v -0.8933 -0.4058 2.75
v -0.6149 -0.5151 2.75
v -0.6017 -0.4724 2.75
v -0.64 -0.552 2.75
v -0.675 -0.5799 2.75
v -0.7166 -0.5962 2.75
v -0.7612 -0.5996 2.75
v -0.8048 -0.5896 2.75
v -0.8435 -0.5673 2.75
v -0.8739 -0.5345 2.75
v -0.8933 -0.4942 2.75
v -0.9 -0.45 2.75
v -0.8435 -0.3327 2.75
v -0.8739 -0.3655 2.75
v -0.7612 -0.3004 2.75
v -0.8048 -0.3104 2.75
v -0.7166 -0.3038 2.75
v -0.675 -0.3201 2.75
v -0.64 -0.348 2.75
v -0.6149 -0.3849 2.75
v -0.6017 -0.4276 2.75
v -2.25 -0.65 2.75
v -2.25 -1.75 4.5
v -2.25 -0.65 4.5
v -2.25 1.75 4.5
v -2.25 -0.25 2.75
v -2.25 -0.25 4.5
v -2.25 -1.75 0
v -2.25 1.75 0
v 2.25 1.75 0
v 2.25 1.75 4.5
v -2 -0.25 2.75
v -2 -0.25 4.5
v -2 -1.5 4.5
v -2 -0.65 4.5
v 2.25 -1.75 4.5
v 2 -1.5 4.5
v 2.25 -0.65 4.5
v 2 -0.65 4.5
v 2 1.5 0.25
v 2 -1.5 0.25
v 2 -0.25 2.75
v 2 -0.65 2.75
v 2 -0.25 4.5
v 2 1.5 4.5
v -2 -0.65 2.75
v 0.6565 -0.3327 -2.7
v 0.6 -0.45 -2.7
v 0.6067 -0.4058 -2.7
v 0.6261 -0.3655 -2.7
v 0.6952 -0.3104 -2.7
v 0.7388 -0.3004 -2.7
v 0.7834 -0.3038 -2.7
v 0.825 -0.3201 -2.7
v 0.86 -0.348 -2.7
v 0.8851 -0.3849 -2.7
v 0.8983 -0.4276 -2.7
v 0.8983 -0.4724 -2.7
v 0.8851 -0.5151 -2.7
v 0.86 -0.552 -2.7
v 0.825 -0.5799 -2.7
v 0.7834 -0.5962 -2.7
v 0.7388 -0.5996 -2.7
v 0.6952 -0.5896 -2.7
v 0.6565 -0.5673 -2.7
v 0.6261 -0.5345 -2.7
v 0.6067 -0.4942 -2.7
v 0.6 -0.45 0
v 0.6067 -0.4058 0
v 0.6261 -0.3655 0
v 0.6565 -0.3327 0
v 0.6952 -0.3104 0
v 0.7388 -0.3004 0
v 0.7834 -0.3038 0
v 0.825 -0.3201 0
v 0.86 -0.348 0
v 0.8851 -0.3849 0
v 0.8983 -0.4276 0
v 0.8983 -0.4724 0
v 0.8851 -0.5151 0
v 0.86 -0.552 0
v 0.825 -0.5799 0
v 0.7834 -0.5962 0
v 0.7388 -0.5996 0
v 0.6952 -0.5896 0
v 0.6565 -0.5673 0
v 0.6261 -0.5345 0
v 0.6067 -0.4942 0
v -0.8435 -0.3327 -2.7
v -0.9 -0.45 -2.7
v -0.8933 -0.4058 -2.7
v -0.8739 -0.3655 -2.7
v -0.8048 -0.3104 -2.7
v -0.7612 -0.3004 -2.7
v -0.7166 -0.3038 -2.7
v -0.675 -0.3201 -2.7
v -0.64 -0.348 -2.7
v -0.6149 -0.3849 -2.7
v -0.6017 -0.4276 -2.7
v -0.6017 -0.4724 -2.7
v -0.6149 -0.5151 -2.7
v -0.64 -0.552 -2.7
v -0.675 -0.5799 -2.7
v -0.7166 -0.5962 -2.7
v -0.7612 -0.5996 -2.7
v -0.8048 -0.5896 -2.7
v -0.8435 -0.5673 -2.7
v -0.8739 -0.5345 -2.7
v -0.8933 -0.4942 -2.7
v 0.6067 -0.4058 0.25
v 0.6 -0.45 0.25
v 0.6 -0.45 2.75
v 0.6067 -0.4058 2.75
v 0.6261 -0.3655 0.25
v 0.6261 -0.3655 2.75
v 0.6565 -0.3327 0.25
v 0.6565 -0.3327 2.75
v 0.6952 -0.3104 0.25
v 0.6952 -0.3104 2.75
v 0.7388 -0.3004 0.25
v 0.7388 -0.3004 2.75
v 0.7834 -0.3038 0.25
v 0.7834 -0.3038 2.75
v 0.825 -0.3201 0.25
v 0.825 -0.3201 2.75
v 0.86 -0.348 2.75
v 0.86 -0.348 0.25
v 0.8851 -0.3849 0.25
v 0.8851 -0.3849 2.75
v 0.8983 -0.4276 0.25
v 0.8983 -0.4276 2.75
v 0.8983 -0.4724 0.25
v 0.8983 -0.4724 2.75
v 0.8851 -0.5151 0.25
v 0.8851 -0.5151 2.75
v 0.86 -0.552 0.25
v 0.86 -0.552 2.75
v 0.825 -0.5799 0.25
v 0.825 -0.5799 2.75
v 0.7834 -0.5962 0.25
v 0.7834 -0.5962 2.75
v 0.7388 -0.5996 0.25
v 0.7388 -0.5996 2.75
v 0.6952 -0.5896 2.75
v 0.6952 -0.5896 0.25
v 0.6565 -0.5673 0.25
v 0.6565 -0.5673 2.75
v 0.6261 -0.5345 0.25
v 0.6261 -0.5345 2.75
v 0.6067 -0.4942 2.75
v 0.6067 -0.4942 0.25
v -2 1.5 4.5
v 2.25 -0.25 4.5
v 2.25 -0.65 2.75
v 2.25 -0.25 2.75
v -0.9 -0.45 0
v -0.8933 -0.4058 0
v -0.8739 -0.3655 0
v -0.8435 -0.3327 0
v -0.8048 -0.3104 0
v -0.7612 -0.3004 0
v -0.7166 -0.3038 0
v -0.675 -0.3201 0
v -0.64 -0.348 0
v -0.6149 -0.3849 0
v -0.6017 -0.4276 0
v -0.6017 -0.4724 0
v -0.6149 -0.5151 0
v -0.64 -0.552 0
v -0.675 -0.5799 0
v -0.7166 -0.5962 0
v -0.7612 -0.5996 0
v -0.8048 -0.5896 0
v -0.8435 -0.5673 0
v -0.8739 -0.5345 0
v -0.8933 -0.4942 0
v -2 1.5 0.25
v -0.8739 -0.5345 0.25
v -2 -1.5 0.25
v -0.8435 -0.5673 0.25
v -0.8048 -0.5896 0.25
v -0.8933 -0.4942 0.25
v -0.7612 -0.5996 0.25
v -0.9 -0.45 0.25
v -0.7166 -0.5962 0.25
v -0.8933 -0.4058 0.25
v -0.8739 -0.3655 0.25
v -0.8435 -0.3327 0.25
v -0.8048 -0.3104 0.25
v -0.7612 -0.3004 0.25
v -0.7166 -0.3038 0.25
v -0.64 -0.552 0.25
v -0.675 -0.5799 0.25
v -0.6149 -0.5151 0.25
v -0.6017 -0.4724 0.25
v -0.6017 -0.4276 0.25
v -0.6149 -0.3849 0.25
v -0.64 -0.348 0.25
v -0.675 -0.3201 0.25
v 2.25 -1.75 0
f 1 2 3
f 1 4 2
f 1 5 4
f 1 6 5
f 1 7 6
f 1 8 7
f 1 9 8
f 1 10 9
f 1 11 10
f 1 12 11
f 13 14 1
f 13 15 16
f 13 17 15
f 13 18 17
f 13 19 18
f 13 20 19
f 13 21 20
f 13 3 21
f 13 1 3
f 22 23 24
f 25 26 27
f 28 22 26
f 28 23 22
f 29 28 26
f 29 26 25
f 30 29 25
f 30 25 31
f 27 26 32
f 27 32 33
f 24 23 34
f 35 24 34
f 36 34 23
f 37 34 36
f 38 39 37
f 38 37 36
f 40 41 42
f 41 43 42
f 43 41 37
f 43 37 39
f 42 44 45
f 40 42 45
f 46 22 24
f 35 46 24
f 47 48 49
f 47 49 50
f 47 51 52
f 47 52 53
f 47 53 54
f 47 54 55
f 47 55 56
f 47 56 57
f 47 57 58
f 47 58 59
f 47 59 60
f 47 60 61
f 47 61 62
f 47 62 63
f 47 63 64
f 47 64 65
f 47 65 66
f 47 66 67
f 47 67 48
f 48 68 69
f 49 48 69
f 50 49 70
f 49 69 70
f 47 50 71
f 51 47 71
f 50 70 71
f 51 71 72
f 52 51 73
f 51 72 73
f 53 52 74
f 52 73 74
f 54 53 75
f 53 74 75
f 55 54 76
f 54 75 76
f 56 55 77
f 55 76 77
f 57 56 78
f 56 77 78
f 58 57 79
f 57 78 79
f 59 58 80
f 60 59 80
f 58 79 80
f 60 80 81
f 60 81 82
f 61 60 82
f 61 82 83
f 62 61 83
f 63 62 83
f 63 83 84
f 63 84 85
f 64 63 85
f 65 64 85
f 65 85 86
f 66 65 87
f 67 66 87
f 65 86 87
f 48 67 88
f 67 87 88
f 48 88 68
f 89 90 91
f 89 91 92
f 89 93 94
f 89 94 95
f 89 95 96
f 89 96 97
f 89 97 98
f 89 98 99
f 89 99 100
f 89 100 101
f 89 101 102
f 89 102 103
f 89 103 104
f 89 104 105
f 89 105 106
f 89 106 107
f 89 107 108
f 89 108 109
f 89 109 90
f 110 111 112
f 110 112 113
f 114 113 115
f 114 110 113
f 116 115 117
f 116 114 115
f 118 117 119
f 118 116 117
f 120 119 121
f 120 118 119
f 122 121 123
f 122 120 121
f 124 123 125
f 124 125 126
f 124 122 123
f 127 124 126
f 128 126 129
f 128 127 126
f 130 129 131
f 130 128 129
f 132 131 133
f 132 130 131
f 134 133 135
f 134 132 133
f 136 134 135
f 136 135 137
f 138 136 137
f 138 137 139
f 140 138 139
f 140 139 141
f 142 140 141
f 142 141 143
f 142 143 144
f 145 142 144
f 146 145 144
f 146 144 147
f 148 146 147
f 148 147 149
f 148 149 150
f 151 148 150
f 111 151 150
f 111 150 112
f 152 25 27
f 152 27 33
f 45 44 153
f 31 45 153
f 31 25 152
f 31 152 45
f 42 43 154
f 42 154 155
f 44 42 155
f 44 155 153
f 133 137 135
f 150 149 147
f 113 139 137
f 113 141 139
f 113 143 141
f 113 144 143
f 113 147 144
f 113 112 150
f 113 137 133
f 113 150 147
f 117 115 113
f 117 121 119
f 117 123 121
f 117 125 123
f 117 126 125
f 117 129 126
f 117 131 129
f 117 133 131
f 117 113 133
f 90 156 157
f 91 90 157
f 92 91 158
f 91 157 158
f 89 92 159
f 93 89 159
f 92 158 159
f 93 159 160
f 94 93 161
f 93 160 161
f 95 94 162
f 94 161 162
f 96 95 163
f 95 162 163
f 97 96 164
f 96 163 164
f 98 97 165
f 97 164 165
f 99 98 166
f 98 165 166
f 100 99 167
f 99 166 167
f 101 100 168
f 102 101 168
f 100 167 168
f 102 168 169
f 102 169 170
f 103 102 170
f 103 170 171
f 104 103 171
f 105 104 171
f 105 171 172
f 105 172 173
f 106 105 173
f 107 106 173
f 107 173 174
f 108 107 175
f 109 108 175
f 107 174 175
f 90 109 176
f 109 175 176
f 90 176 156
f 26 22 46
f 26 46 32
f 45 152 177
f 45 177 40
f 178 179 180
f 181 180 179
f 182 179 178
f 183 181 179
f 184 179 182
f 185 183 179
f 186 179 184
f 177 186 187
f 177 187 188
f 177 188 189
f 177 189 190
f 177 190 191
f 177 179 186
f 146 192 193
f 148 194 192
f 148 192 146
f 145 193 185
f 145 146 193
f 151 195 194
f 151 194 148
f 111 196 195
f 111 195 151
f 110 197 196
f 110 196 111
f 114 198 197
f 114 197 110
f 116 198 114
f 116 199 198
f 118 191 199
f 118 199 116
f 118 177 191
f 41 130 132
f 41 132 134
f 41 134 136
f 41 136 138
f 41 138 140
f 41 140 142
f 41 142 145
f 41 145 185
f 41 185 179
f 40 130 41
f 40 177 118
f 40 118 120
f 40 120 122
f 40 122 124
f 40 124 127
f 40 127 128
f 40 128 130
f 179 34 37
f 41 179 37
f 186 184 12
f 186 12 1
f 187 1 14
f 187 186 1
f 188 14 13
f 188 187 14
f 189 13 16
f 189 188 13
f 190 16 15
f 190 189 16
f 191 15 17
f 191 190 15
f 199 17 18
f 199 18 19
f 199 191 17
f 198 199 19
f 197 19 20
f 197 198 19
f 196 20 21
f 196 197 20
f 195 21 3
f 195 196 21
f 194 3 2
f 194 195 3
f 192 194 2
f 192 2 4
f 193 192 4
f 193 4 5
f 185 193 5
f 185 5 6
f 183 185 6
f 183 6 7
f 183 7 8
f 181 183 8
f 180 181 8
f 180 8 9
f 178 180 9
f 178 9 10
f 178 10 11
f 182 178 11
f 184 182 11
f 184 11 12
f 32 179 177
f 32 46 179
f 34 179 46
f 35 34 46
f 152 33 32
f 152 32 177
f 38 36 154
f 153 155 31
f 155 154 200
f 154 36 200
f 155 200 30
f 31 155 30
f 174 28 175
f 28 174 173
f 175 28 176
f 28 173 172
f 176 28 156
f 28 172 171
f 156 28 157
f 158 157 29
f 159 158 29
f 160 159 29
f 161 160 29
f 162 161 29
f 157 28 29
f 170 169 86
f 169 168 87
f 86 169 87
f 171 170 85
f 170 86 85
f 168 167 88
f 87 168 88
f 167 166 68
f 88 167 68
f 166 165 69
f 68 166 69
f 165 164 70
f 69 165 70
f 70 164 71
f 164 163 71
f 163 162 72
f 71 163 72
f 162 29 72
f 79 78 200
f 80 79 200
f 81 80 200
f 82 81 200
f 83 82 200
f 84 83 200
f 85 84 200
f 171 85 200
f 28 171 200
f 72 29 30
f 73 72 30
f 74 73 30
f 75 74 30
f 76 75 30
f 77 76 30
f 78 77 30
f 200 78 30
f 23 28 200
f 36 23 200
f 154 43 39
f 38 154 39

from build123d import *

# Parameters (mm, degrees)
SKETCH1_W                = 4.5
SKETCH1_H                = 3.5
BOSS_EXTRUDE1_DEPTH      = 4.5
SKETCH2_W                = 4
SKETCH2_H                = 3
CUT_EXTRUDE1_DEPTH       = 4.25
SKETCH3_R                = 0.15
BOSS_EXTRUDE2_DEPTH      = 2.7
BOSS_EXTRUDE2_DEPTH_BACK = 4
SKETCH4_W                = 3.5
SKETCH4_H                = 0.4
CUT_EXTRUDE2_DEPTH       = 5.5


with BuildPart() as part:
    # Sketch1 → Boss-Extrude1 (new body)
    with BuildSketch(Plane.XY):
        Rectangle(SKETCH1_W, SKETCH1_H)
    extrude(amount=BOSS_EXTRUDE1_DEPTH)

    # Sketch2 → Cut-Extrude1 (cut)
    with BuildSketch(Plane.XY.offset(4.5)):
        Rectangle(SKETCH2_W, SKETCH2_H)
    extrude(amount=-CUT_EXTRUDE1_DEPTH, mode=Mode.SUBTRACT)

    # Sketch3 → Boss-Extrude2 (add, two sides)
    with BuildSketch(Plane(origin=(0, 0, 0), x_dir=(-1, 0, 0), z_dir=(0, 0, -1))) as boss_extrude2_sk:
        with Locations((-0.75, -0.45)):
            Circle(SKETCH3_R)
        with Locations((0.75, -0.45)):
            Circle(SKETCH3_R)
    extrude(amount=BOSS_EXTRUDE2_DEPTH)
    extrude(boss_extrude2_sk.sketch, amount=-BOSS_EXTRUDE2_DEPTH_BACK)

    # Sketch4 → Cut-Extrude2 (cut, through all)
    with BuildSketch(Plane.ZY.offset(2.25)):
        with Locations((4.5, -0.45)):
            Rectangle(SKETCH4_W, SKETCH4_H)
    extrude(amount=-CUT_EXTRUDE2_DEPTH, mode=Mode.SUBTRACT)


solid = part.part
